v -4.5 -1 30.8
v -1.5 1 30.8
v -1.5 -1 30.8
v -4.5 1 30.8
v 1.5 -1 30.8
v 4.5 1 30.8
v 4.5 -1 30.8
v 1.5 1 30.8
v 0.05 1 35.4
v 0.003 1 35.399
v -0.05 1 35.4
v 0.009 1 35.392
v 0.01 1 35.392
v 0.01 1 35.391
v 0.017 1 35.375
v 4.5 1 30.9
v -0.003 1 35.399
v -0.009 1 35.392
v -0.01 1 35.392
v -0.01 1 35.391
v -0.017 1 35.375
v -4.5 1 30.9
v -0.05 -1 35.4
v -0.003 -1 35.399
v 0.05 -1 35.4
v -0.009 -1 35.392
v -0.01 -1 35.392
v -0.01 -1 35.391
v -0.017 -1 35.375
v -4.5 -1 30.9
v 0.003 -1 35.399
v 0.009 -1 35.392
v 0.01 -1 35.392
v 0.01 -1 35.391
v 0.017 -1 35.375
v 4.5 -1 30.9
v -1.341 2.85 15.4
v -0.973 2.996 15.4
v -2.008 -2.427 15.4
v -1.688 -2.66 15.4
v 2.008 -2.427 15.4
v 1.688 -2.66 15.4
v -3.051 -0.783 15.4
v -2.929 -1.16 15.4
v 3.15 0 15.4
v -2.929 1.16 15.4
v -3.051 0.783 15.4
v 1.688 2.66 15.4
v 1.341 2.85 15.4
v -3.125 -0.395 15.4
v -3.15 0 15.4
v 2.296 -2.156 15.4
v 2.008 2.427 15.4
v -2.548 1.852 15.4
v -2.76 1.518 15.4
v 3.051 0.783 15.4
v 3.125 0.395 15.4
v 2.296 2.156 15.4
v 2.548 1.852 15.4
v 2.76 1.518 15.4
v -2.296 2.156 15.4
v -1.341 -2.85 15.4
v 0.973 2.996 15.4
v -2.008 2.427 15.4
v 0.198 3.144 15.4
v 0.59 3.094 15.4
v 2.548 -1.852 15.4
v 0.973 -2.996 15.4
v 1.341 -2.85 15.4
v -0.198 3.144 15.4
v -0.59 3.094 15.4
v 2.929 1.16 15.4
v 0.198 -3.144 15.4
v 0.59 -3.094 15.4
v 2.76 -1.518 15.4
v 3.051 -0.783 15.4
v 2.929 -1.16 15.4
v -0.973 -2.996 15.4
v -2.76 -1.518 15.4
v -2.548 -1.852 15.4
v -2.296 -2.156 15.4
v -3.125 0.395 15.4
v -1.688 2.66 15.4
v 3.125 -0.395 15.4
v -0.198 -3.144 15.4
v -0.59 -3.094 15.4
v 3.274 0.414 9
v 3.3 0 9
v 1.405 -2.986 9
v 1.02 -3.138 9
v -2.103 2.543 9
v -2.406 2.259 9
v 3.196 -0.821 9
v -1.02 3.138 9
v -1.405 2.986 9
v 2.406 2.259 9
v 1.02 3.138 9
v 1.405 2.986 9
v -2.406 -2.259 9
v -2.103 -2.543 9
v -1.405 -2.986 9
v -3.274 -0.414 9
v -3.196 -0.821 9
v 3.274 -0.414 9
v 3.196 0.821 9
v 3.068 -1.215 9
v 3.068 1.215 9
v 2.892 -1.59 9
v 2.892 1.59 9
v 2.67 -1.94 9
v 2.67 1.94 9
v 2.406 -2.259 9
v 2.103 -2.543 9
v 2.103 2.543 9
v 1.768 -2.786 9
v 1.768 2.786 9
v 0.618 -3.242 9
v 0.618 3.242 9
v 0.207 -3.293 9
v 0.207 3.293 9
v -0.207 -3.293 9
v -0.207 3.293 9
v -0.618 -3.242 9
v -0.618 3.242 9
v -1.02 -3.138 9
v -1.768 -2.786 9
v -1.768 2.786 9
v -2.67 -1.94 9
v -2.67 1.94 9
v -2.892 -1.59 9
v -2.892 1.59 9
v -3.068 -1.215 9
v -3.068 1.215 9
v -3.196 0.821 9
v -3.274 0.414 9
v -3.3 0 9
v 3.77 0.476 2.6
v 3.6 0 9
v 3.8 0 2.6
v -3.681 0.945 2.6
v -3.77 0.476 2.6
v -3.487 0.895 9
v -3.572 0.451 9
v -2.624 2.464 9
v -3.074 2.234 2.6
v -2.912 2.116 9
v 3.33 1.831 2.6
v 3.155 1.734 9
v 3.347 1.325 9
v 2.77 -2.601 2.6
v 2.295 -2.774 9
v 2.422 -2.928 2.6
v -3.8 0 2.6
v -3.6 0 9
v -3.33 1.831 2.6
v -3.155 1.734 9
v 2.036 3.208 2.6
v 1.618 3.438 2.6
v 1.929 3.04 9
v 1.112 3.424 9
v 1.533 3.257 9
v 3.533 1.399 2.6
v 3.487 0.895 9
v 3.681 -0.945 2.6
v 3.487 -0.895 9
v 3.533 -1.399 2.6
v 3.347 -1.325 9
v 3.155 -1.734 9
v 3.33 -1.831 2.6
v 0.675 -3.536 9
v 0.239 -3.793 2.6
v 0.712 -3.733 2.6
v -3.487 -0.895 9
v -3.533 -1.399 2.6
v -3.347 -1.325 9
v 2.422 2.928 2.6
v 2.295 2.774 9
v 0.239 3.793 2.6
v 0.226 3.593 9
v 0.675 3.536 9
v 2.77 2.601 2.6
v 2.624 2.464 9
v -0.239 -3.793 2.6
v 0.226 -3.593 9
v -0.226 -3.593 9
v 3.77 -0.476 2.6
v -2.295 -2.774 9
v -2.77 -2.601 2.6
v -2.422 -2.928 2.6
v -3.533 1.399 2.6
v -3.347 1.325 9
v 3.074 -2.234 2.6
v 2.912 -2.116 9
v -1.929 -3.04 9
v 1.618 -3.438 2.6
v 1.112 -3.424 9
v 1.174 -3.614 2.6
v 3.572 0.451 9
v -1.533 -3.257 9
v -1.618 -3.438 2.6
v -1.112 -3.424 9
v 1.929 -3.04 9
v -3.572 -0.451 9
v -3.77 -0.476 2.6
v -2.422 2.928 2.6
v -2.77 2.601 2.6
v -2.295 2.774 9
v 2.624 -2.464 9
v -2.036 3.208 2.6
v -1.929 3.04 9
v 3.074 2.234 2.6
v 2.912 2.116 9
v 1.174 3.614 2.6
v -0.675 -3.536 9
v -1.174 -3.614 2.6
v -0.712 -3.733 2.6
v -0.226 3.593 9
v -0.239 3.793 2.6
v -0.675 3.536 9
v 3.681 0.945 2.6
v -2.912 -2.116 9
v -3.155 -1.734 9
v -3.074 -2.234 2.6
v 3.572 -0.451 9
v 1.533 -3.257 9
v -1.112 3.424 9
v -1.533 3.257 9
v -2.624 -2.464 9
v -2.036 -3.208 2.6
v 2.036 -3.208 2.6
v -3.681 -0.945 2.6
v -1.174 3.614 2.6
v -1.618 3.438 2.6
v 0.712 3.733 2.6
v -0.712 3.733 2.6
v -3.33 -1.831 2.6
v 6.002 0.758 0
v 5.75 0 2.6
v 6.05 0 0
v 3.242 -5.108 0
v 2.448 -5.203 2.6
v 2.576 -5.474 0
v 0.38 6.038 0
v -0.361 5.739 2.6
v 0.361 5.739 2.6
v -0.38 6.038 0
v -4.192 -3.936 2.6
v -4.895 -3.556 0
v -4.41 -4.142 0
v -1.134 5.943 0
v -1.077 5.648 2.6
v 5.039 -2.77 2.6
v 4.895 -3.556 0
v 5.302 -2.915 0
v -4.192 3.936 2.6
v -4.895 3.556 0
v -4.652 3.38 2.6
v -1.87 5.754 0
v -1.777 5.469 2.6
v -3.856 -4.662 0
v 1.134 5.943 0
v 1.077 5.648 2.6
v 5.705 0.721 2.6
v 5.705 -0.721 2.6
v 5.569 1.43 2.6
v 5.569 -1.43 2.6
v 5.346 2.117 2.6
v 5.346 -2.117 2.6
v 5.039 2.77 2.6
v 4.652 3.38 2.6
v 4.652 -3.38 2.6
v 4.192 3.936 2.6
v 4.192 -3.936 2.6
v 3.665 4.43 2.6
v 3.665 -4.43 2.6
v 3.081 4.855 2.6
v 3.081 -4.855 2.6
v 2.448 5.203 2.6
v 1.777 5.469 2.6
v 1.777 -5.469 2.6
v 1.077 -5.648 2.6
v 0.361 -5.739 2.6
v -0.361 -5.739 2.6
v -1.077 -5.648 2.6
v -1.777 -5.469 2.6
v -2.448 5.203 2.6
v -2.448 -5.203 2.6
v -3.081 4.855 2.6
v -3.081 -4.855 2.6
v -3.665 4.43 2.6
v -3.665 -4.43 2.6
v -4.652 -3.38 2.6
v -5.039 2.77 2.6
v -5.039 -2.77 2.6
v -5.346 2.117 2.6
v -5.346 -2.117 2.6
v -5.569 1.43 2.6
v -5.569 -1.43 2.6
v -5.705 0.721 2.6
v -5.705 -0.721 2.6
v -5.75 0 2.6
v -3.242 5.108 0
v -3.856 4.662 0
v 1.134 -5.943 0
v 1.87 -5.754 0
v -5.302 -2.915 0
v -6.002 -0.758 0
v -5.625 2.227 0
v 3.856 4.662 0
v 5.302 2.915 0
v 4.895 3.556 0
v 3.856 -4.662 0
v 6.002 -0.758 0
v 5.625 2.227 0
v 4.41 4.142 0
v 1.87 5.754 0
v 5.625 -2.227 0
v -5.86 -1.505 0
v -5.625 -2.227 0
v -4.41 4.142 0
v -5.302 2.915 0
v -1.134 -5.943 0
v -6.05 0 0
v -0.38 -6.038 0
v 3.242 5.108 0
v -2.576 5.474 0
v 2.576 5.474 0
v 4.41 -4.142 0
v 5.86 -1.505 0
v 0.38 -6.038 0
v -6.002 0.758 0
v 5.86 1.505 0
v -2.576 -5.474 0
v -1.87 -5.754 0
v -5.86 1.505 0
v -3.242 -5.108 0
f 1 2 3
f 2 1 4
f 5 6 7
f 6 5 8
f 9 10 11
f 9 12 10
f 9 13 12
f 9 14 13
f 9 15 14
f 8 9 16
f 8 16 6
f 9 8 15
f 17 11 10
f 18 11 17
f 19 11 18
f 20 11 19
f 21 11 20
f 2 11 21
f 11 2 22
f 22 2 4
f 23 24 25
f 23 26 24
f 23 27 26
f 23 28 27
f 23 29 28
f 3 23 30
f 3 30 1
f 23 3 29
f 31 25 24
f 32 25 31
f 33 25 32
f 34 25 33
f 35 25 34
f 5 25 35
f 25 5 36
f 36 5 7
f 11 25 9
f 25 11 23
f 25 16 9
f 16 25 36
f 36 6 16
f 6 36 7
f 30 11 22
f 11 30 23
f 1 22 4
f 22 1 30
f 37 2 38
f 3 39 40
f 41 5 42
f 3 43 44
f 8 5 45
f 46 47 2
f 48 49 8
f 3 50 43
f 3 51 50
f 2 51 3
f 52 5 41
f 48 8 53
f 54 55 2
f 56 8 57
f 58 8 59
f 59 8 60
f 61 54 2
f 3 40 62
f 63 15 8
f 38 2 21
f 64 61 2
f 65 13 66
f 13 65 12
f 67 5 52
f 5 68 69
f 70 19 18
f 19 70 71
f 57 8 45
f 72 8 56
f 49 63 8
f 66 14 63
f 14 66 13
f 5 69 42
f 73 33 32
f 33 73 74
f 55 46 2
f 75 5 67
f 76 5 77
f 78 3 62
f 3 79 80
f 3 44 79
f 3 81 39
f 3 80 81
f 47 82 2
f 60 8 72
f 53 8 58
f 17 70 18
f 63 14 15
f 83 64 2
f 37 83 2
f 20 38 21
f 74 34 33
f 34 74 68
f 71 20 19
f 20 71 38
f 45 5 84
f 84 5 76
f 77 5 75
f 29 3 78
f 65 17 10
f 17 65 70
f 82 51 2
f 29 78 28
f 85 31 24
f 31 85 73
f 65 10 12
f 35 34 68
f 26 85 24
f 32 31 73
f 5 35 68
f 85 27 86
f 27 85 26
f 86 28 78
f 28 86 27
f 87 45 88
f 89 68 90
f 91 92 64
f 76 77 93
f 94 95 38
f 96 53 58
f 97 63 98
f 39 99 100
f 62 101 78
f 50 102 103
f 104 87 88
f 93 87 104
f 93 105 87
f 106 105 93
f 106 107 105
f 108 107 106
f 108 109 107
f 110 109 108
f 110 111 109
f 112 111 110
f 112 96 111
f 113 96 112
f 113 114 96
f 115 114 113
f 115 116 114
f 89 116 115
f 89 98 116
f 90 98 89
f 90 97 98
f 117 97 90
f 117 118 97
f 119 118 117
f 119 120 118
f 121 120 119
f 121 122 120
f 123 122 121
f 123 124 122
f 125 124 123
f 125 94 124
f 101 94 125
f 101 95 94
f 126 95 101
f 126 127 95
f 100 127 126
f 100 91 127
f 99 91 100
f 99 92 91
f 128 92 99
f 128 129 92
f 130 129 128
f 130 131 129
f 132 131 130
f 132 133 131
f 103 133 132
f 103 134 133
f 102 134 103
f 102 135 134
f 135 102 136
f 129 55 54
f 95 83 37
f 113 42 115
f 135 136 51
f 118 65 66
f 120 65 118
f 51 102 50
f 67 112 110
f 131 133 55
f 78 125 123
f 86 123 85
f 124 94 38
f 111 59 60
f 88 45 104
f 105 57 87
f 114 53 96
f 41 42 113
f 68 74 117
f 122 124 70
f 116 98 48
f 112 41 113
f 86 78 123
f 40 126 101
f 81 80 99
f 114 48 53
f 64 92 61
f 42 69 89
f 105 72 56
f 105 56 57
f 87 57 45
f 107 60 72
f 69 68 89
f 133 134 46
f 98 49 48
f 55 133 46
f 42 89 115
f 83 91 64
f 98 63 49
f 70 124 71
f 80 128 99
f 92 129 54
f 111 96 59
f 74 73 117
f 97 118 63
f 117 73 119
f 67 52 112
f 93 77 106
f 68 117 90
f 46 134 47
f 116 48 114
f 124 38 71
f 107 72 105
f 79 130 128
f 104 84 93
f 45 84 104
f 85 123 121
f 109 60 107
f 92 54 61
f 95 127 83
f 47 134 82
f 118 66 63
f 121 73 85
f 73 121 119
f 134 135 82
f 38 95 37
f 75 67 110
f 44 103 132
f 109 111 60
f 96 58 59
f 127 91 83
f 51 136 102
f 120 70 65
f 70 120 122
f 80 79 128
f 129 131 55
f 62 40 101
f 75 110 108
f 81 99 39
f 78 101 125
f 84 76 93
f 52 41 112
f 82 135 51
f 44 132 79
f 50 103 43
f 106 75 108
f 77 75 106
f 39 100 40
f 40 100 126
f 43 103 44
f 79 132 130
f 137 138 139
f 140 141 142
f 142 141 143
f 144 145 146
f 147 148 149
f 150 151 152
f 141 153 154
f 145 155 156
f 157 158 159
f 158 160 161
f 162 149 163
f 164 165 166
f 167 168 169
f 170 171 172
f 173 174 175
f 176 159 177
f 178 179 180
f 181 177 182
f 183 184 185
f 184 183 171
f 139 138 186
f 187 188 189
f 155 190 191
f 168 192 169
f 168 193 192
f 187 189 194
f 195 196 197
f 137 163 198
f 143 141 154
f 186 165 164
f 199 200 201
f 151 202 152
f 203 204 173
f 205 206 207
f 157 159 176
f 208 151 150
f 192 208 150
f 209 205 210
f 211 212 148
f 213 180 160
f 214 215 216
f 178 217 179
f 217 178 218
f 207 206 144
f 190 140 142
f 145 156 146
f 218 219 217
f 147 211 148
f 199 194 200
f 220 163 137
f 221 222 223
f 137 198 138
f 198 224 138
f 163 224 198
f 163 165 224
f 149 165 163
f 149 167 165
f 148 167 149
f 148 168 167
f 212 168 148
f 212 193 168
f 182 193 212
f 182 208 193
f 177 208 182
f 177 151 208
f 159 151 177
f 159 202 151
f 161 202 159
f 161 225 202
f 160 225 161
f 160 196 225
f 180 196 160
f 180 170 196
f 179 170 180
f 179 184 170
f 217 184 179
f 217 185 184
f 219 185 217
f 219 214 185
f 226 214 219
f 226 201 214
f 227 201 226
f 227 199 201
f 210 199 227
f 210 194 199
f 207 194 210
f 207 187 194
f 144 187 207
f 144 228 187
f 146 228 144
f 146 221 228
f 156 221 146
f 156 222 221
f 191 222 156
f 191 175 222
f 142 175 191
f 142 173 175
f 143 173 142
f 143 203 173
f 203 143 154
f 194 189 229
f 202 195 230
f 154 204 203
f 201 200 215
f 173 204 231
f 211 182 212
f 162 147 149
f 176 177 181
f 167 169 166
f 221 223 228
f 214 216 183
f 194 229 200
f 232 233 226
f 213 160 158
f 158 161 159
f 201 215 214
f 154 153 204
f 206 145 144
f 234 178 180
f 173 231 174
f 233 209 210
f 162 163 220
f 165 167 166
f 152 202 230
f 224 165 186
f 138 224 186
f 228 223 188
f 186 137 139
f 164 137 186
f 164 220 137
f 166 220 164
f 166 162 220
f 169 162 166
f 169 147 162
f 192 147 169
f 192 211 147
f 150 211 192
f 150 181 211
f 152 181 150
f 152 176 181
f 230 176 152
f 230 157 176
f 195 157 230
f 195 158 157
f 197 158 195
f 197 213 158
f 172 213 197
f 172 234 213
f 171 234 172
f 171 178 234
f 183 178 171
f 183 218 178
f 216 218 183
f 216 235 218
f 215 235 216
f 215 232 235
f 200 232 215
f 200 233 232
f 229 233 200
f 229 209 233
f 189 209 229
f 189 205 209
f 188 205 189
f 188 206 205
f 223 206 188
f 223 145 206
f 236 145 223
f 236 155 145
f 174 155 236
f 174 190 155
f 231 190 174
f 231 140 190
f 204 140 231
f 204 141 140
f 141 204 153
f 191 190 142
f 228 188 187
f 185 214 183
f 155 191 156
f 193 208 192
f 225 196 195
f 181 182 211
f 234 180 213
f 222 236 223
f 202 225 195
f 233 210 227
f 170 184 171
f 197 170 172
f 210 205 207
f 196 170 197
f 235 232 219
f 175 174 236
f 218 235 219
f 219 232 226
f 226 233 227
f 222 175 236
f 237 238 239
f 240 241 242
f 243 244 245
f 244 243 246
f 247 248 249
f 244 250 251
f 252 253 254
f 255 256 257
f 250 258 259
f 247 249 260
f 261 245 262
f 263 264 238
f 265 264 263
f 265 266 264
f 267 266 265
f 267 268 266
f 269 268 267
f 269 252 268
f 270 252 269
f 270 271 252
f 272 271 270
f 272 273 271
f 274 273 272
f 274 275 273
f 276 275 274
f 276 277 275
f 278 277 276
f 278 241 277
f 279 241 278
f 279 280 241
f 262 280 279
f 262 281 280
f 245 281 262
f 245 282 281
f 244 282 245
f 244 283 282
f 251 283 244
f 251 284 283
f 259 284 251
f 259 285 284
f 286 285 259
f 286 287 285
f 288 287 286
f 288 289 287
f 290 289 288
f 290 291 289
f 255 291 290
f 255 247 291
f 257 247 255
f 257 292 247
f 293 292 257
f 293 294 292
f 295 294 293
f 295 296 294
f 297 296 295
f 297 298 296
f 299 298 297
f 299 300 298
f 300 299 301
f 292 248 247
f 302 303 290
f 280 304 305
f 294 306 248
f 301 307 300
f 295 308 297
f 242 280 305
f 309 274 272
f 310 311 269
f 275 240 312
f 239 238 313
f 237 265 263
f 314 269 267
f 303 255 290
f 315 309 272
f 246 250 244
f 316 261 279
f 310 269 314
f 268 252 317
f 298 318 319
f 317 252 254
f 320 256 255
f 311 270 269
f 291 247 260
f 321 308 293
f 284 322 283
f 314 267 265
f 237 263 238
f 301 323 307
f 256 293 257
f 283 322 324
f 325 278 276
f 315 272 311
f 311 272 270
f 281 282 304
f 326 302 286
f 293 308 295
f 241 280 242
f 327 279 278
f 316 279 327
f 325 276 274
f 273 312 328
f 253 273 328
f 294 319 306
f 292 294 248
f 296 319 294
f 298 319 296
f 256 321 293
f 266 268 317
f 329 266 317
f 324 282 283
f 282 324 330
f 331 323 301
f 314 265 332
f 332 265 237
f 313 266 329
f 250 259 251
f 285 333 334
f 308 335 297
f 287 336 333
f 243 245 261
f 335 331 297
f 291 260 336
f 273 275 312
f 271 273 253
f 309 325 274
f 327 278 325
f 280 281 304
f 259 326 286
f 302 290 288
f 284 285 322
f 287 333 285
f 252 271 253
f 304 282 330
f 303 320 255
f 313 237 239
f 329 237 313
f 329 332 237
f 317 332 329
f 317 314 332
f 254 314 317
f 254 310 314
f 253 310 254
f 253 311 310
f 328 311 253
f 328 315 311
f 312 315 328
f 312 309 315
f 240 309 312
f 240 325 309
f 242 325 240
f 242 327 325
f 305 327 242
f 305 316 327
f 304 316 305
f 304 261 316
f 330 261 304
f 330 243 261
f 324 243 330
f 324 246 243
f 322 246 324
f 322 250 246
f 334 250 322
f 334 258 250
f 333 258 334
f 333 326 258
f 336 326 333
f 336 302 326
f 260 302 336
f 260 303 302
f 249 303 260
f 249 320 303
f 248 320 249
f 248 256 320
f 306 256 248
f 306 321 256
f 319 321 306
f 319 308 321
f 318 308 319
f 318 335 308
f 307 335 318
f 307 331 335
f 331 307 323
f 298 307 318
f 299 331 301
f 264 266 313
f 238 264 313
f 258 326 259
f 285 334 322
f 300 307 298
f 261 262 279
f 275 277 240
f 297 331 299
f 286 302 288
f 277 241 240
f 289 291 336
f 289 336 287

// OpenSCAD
// Diameters
d = [12.1, 11.5, 7.6, 7.2, 6.6, 6.3];
// Heights
h = [2.6, 6.4, 6.4, 2.4, 13, 4.6];
// x and y dimensions for the stem, plus width of the barb
stem = [3, 2, 9];
// Match the original design or use the more robust design
original = false;
// A very small amount, used in hulls mainly
small = 0.1;
// Resolution of circular objects
$fn = 50;

module plug(d=d, h=h, stem=stem, original=original, small=small, $fn=$fn) {
  cylinder(h=h[0], d1=d[0], d2=d[1]);
  translate([0, 0, h[0]]) {
    cylinder(h=h[1], d1=d[2], d2=d[3]);
    translate([0, 0, h[1]]) {
      cylinder(h=h[2], d1=d[4], d2=d[5]);
      translate([0, 0, h[2]]) {
        hull() {
          translate([0, 0, -0.1]) cylinder(h=small, d=d[5]);
          translate([0, 0, h[3] - small + (original ? 0 : h[4])]) {
            translate([-stem[0] / 2, -stem[1] / 2, 0]) {
              cube([stem[0], stem[1], small]);
            }
            if (!original)
            for(i=[-1:2:1])
            translate([0, i * (stem[1] / 2 - small / 2), 0]) {
              cylinder(h=h[5] + small, d=small);
            }
          }
        }
        translate([0, -stem[1] / 2, h[3]]) {
          translate([-stem[0] / 2, 0, 0]) {
            cube([stem[0], stem[1], h[4]]);
          }
          translate([-stem[2] / 2, 0, h[4]])
          hull() {
            cube([stem[2], stem[1], small]);
            translate([stem[2] / 2 - small / 2, 0, h[5] - small]) {
              cube([small, stem[1], small]);
            }
          }
        }
      }
    }
  }
}

plug(d, h, stem, original, small, $fn);
